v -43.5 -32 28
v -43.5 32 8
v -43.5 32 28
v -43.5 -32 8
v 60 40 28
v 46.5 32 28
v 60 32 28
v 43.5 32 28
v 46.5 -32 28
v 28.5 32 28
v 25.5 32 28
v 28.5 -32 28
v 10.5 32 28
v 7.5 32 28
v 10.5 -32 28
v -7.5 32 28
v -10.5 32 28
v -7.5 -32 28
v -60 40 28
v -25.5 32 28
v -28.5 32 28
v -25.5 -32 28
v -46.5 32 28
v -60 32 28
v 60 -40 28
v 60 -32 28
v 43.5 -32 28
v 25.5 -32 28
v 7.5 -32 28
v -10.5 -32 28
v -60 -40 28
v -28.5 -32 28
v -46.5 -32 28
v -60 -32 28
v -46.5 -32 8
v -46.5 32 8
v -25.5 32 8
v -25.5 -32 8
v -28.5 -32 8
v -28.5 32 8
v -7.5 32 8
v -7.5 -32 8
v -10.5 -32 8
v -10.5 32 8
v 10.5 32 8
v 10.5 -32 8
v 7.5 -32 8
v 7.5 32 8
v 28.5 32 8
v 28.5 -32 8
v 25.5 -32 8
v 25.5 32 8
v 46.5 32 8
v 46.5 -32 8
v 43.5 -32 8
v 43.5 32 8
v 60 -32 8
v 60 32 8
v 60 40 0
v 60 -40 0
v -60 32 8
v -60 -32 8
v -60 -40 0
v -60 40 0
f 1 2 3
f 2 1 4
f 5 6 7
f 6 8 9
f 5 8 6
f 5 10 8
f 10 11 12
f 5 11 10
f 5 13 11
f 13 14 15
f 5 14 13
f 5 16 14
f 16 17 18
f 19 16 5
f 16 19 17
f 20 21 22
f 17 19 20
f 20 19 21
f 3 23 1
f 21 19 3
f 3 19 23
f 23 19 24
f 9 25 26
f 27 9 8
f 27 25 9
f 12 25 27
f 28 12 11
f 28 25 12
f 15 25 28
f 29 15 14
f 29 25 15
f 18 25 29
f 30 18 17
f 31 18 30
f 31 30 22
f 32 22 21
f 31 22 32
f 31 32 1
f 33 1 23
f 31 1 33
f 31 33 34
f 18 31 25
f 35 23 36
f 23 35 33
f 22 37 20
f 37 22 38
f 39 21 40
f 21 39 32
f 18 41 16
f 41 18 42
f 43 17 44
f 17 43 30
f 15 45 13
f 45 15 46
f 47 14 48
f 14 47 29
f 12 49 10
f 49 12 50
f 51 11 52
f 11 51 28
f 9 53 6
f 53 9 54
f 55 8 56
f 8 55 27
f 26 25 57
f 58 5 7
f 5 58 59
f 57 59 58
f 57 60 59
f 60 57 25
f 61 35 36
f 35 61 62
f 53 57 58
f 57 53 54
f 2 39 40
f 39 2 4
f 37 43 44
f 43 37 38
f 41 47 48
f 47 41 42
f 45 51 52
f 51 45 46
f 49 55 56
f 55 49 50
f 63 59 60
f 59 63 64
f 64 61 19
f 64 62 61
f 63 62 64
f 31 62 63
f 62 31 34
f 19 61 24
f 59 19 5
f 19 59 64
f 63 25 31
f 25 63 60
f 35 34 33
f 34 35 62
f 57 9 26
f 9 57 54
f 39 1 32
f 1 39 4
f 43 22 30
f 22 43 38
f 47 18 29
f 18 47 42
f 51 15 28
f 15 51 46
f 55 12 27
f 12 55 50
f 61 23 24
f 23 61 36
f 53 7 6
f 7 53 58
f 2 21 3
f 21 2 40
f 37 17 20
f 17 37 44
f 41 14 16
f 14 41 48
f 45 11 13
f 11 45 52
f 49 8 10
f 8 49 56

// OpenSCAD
$fn = 32;

// ----------------------------------------------------------------------
// Rib frame 120 x 80 x 28
// 6 ribs at 18 mm pitch
// ----------------------------------------------------------------------

// --- parameters (mm) ---
frame = [120, 80, 8];  // base plate size (x, y, z)
rail_w = 8;            // side rail width
ribs = 6;              // number of ribs
rib_t = 3;             // rib thickness
rib_h = 20;            // rib height above the base plate
pitch = 18;            // pitch between rib centres

// --- derived feature positions (mm) ---
span = (ribs - 1) * pitch;          // = 90   distance between the outer ribs
origin_x = -span / 2;               // = -45   X of the first rib
rib_len = frame[1] - 2 * rail_w + 2;  // = 66   rib length, 1 mm into each rail
feature_centers = [
  [origin_x + 0 * pitch, 0],
  [origin_x + 1 * pitch, 0],
  [origin_x + 2 * pitch, 0],
  [origin_x + 3 * pitch, 0],
  [origin_x + 4 * pitch, 0],
  [origin_x + 5 * pitch, 0]
];   // rib centre line, drives the rib loop

// base plate, two side rails, then the ribs read straight off feature_centers
union() {
  translate([-frame[0] / 2, -frame[1] / 2, 0]) cube(frame);
  translate([-frame[0] / 2, -frame[1] / 2, 0]) cube([frame[0], rail_w, frame[2] + rib_h]);
  translate([-frame[0] / 2, frame[1] / 2 - rail_w, 0]) cube([frame[0], rail_w, frame[2] + rib_h]);
  for (centre = feature_centers)
    translate([centre[0] - rib_t / 2, centre[1] - rib_len / 2, frame[2] - 1])
      cube([rib_t, rib_len, rib_h + 1]);
}
